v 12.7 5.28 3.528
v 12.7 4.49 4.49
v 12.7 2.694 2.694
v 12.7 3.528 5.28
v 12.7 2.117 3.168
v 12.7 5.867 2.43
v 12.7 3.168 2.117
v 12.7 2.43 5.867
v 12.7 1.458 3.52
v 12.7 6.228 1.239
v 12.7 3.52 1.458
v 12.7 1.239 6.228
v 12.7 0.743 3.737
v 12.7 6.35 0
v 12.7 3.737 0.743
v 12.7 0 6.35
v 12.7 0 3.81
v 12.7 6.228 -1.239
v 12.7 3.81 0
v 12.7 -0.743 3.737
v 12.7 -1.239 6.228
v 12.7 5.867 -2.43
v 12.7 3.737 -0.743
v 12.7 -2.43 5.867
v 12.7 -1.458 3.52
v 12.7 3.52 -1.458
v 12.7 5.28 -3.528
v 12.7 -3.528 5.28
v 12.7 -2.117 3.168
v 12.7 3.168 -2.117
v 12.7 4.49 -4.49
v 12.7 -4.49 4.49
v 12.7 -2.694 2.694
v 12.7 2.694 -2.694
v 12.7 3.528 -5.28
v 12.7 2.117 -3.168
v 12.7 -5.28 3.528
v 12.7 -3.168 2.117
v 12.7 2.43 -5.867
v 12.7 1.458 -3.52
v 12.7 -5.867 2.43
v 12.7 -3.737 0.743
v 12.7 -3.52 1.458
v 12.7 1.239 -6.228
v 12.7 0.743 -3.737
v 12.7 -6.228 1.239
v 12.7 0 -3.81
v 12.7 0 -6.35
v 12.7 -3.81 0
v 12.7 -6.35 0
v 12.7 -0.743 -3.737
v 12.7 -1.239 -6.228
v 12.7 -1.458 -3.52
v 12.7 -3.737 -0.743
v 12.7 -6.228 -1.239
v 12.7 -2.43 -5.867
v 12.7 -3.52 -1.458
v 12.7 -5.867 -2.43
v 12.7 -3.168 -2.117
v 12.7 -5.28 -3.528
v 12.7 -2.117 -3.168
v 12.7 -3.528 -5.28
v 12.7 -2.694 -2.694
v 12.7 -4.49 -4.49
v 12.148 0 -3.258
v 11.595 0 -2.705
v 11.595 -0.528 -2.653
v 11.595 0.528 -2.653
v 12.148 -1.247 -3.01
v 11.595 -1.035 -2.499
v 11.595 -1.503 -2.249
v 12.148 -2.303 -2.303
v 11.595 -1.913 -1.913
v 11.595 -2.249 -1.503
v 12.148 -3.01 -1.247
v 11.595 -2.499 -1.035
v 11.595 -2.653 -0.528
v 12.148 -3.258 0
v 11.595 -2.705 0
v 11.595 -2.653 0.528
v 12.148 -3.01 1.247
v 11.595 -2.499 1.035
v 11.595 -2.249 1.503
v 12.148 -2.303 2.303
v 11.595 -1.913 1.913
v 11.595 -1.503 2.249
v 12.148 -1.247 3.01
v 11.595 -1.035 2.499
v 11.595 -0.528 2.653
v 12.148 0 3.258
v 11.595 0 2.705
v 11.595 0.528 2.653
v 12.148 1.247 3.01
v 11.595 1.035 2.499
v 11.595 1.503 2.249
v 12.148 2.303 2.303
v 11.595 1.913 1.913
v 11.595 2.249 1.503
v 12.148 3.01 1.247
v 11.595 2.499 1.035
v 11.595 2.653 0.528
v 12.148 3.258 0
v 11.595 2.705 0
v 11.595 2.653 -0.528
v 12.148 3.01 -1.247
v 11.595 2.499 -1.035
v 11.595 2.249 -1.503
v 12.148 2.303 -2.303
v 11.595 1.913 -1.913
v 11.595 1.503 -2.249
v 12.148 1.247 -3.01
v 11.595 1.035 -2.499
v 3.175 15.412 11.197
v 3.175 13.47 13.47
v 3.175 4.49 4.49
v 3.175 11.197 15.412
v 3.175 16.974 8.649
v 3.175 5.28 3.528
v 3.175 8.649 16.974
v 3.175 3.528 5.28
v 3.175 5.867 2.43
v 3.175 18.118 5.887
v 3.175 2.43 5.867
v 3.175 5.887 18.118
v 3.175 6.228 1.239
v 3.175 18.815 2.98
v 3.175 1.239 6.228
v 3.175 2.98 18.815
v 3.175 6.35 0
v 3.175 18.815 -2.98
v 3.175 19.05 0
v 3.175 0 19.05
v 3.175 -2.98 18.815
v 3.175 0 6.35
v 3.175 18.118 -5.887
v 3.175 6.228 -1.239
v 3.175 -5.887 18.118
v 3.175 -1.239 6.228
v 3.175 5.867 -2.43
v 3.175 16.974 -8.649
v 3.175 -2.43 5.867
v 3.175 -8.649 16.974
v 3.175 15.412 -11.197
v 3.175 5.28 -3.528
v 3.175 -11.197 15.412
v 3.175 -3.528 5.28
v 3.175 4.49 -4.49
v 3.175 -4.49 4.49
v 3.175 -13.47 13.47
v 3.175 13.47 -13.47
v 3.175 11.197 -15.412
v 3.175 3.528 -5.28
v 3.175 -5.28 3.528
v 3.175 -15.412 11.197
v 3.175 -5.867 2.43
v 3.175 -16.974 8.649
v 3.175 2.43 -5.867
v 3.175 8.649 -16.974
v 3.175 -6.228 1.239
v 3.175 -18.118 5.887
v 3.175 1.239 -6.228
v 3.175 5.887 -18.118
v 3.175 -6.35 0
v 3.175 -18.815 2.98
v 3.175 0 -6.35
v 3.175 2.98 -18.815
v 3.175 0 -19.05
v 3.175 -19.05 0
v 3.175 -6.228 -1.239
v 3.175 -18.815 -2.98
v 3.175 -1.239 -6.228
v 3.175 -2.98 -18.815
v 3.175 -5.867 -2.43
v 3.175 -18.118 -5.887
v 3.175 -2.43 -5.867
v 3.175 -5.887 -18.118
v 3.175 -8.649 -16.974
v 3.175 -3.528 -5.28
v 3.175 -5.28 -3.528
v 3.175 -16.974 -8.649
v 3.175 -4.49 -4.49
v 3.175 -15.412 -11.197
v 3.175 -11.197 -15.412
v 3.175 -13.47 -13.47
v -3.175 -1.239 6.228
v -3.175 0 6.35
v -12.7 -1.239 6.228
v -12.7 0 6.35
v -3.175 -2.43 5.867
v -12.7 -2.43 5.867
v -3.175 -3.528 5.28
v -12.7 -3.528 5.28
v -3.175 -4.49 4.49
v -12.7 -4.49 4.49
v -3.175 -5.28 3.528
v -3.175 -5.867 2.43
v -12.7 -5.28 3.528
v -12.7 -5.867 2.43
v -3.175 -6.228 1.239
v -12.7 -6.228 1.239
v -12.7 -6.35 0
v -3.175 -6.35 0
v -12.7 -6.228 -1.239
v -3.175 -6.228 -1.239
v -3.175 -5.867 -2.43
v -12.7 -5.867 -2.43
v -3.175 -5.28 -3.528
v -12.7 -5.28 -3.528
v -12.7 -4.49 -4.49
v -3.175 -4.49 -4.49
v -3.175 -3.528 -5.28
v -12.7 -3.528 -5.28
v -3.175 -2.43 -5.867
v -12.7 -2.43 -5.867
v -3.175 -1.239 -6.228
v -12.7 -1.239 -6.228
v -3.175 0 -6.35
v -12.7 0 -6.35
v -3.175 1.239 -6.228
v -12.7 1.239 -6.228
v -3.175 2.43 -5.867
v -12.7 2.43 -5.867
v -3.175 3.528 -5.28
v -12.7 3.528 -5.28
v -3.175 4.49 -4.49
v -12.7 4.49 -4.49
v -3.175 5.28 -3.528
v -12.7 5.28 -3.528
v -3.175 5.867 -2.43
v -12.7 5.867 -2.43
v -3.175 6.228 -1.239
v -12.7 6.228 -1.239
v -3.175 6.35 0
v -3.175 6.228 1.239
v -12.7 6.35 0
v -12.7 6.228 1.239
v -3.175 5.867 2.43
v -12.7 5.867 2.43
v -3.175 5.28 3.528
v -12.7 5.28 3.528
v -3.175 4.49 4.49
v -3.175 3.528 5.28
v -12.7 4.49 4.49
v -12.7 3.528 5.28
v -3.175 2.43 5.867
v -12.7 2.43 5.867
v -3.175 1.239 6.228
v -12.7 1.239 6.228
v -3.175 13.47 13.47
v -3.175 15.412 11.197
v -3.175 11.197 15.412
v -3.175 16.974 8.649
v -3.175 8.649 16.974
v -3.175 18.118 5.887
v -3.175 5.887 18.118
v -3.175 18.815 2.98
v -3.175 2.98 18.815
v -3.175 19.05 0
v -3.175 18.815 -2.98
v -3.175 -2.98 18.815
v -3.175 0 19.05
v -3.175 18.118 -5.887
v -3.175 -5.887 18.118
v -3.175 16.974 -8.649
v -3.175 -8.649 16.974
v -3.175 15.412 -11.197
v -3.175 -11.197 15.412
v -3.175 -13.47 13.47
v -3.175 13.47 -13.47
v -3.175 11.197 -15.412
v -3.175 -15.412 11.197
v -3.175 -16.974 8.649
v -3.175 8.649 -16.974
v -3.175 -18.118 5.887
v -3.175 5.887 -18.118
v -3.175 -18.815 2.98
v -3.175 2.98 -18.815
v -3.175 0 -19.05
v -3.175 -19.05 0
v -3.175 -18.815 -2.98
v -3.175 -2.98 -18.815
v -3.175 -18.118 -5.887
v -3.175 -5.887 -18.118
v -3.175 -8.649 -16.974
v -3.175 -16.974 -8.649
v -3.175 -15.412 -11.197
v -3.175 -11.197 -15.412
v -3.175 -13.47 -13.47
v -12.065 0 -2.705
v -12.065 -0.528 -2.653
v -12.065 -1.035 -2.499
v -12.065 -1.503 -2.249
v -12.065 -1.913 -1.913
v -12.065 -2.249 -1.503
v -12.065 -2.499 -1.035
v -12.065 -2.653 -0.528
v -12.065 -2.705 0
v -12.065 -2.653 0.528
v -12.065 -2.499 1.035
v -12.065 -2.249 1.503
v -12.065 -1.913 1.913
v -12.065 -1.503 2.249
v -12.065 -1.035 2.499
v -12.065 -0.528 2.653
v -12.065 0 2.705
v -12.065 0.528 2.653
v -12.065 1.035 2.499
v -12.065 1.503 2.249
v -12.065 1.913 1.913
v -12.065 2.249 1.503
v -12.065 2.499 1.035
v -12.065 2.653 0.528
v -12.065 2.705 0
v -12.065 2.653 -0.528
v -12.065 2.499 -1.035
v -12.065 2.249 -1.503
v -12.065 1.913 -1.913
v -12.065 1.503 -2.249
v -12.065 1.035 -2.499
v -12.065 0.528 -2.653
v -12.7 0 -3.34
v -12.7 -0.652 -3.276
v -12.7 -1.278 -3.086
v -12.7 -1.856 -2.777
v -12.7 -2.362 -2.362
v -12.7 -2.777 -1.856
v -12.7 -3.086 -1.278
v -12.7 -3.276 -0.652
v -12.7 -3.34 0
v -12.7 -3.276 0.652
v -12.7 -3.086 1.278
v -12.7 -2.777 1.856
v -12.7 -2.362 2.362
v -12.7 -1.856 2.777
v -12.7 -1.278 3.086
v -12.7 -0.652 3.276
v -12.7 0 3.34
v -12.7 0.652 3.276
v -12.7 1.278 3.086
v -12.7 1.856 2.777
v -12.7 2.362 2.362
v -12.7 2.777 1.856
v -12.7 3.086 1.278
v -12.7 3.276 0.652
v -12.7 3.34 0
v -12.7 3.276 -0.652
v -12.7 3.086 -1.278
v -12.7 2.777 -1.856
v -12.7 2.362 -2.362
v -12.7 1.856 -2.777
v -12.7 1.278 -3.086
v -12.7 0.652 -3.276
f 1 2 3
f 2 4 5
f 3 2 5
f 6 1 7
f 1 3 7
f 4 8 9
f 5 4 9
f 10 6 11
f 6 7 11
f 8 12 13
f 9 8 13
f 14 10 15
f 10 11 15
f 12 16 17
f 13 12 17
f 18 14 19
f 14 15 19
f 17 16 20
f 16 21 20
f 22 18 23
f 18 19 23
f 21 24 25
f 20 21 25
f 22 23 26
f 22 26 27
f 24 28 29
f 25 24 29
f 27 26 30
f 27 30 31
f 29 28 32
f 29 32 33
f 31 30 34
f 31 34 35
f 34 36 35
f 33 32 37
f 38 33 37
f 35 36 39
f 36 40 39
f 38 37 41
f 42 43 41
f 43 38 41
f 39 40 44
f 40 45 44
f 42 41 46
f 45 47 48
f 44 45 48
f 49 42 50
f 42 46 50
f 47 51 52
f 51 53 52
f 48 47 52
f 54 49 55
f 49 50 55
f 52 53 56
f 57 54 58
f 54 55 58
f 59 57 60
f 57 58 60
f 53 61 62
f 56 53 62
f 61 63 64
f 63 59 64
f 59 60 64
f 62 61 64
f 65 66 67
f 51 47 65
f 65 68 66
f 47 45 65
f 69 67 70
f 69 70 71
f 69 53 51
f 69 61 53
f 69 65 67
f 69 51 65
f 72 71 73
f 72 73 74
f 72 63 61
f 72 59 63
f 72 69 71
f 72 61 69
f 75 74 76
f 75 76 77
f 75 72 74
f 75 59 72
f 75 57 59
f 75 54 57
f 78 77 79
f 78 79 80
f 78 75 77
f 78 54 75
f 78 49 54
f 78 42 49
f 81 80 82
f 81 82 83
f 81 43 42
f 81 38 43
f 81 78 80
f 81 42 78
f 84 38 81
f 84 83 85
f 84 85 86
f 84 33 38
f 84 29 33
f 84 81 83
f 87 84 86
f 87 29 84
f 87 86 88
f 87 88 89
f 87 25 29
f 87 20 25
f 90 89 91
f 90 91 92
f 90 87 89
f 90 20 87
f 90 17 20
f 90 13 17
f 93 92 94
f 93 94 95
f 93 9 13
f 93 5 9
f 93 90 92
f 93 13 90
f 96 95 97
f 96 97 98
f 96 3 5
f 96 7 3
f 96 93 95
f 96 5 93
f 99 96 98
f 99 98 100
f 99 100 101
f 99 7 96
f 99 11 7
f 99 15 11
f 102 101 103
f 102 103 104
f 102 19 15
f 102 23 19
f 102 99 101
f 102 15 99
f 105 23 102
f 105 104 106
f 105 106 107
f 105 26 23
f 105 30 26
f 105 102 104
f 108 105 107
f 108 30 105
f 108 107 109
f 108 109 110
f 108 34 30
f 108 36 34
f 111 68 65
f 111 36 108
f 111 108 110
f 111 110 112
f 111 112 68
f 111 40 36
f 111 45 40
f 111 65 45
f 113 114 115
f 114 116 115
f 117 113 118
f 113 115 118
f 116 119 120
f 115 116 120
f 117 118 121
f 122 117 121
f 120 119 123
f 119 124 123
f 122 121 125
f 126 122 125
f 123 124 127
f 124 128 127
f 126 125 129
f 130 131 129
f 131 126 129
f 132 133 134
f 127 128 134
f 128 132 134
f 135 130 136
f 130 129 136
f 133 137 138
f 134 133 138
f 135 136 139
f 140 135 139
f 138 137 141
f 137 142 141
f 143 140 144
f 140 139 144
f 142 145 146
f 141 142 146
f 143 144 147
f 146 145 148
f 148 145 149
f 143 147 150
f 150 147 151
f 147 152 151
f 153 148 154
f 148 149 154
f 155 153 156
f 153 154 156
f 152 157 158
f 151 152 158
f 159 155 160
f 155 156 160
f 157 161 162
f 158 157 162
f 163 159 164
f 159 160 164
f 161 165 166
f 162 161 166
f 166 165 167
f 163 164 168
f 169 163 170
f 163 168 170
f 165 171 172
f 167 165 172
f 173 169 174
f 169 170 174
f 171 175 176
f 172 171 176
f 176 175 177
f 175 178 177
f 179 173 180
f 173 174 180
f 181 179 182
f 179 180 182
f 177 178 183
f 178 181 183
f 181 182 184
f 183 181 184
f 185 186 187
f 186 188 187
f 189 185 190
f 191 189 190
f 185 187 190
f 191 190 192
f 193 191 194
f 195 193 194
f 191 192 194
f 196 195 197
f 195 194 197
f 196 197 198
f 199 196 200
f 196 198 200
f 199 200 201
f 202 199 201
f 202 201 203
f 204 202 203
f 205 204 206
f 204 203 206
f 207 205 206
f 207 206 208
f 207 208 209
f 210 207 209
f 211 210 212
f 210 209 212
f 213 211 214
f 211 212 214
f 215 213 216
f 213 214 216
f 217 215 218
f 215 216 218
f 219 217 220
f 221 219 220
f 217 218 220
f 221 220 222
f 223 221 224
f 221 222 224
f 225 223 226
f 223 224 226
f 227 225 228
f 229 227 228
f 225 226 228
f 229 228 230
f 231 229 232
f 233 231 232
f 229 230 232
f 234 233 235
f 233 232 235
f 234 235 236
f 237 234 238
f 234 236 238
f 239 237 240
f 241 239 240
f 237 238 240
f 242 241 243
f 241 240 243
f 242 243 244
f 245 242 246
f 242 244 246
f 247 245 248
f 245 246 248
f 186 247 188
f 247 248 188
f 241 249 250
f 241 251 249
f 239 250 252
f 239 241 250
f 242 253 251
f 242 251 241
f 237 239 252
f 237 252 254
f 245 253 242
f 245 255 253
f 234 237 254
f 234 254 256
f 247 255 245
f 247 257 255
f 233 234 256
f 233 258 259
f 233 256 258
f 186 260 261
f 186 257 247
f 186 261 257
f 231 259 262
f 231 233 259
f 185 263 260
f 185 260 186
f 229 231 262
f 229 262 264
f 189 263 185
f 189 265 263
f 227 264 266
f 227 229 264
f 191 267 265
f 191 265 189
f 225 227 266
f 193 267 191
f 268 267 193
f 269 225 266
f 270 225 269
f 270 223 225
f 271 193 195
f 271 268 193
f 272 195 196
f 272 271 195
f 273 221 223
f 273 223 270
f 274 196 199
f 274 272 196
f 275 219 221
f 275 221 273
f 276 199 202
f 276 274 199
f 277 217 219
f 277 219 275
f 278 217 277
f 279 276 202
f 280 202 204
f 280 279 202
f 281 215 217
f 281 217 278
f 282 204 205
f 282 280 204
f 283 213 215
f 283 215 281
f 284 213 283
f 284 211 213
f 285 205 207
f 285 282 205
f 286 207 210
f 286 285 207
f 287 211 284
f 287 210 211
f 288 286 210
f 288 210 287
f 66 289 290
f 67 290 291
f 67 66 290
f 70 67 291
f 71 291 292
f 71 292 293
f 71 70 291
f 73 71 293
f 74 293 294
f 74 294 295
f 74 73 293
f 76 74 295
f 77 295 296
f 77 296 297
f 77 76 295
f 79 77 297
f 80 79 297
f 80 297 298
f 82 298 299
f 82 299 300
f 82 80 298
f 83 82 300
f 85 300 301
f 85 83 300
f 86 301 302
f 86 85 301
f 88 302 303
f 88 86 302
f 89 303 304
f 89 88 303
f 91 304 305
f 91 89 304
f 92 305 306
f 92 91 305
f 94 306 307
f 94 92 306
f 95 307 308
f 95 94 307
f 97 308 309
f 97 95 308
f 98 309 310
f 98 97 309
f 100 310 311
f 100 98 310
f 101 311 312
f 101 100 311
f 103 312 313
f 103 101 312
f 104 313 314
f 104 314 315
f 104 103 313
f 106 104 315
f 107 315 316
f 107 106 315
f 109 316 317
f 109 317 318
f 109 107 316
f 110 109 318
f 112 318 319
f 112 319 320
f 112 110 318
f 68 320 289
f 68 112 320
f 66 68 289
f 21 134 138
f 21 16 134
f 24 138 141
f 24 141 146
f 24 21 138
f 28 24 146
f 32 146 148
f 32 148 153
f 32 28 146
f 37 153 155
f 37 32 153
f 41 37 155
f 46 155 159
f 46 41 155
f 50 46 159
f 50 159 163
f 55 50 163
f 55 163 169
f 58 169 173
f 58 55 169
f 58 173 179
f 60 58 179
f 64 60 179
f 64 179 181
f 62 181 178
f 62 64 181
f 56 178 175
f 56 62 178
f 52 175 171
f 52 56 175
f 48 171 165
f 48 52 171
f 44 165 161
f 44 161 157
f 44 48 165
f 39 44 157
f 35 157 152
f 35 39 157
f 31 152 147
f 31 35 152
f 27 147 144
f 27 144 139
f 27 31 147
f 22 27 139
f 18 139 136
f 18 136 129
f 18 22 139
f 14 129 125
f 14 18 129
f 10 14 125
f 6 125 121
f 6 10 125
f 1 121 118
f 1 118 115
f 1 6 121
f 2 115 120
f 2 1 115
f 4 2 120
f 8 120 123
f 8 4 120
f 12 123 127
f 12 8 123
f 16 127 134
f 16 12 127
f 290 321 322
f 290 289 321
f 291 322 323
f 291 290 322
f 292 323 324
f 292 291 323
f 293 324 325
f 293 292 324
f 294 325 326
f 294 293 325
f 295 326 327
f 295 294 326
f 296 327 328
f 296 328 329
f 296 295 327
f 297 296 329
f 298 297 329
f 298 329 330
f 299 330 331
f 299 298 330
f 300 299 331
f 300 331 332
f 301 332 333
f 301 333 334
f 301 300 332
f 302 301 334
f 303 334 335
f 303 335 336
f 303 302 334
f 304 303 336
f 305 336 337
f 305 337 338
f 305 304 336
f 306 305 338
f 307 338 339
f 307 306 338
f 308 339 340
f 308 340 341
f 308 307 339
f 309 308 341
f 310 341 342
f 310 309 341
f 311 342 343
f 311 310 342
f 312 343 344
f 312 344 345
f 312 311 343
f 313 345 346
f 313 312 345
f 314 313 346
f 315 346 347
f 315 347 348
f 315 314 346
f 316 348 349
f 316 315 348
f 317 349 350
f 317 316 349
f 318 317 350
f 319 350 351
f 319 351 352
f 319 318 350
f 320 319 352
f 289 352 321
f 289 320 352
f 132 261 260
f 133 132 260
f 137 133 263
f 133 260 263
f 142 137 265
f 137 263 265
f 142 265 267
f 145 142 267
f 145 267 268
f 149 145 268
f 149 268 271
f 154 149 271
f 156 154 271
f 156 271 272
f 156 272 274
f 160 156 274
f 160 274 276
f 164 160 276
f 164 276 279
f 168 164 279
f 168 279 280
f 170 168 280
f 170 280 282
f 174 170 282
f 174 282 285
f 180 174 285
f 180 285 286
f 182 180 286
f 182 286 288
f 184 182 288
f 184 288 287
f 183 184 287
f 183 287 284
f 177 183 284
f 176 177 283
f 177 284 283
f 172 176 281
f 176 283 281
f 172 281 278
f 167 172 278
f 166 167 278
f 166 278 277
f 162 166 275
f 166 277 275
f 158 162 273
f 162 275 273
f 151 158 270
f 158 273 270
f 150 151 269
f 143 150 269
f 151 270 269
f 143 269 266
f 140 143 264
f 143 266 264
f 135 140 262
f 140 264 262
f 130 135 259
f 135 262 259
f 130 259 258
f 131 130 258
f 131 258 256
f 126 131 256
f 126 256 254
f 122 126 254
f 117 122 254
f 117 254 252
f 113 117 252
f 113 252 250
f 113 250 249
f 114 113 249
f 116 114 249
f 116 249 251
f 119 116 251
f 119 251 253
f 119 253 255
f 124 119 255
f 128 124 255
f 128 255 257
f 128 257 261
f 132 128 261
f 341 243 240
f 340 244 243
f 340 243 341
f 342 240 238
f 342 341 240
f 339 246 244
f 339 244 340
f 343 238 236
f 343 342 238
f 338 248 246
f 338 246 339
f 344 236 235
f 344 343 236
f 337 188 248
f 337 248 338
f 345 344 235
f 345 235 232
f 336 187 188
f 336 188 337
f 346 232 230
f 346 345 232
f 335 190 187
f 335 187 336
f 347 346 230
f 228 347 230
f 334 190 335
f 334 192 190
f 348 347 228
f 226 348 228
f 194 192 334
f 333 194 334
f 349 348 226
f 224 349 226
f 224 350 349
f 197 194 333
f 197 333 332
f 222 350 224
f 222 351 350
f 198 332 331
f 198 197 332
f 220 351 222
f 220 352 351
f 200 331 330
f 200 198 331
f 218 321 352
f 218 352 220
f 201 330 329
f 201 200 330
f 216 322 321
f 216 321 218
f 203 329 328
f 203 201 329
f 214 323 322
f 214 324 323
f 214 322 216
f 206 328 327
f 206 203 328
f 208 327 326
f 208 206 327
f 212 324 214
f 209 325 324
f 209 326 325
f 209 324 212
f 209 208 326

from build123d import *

# Parameters (mm, degrees)
SKETCH1_W   = 9.525
SKETCH1_H   = 6.35
SKETCH1_W_2 = 3.175
SKETCH1_H_2 = 19.05


with BuildPart() as part:
    # Sketch1 → Revolve1 (revolve)
    with BuildSketch(Plane.XY, mode=Mode.PRIVATE) as revolve1_sk:
        with Locations((7.9375, 3.175)):
            Rectangle(SKETCH1_W, SKETCH1_H)
        with Locations((1.5875, 9.525)):
            Rectangle(SKETCH1_W_2, SKETCH1_H_2)
    revolve1 = revolve(revolve1_sk.sketch.rotate(Axis((0, 0, 0), (1, 0, 0)), 90), axis=Axis((0, 0, 0), (1, 0, 0)))

    # Mirror1: Revolve1 across Right Plane
    add(revolve1.mirror(Plane(origin=(0, 0, 0), x_dir=(0, 0, -1), z_dir=(1, 0, 0))))

    # Sketch3 → 1/4-28 Tapped Hole1 (revolve, cut)
    with BuildSketch(Plane(origin=(12.7, 0, 0), x_dir=(0, 0, -1), z_dir=(0, 1, 0))):
        Polygon((0, 0), (0, 25.4), (3.3401, 25.4), (2.7051, 24.765), (2.7051, 1.1049), (3.81, 0), align=None)
    revolve(axis=Axis((19.05, 0, 0), (-1, 0, 0)), mode=Mode.SUBTRACT)


solid = part.part
